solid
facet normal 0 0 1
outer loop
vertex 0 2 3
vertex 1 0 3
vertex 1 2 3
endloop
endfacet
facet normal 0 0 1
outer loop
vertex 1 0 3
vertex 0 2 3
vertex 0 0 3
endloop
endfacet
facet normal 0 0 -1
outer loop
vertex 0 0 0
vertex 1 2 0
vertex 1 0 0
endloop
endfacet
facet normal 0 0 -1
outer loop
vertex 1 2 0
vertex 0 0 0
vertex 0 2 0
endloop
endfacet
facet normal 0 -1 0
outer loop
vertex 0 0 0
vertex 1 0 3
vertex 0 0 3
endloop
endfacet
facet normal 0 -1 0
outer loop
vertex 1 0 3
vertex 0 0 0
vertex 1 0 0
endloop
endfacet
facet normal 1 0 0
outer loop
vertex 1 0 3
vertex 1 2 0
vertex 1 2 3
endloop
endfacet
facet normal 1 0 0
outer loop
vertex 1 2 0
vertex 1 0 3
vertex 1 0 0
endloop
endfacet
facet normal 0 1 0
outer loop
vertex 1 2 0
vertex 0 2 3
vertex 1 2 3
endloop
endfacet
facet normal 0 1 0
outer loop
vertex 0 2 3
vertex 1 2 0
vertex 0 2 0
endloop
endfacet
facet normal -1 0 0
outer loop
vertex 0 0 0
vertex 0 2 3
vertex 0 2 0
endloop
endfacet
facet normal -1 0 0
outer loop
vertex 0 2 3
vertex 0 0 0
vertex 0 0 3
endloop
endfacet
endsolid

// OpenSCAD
// test comment
translate(0, 0, 0) translate(1,1,1) cube([1, 2, 3]);
